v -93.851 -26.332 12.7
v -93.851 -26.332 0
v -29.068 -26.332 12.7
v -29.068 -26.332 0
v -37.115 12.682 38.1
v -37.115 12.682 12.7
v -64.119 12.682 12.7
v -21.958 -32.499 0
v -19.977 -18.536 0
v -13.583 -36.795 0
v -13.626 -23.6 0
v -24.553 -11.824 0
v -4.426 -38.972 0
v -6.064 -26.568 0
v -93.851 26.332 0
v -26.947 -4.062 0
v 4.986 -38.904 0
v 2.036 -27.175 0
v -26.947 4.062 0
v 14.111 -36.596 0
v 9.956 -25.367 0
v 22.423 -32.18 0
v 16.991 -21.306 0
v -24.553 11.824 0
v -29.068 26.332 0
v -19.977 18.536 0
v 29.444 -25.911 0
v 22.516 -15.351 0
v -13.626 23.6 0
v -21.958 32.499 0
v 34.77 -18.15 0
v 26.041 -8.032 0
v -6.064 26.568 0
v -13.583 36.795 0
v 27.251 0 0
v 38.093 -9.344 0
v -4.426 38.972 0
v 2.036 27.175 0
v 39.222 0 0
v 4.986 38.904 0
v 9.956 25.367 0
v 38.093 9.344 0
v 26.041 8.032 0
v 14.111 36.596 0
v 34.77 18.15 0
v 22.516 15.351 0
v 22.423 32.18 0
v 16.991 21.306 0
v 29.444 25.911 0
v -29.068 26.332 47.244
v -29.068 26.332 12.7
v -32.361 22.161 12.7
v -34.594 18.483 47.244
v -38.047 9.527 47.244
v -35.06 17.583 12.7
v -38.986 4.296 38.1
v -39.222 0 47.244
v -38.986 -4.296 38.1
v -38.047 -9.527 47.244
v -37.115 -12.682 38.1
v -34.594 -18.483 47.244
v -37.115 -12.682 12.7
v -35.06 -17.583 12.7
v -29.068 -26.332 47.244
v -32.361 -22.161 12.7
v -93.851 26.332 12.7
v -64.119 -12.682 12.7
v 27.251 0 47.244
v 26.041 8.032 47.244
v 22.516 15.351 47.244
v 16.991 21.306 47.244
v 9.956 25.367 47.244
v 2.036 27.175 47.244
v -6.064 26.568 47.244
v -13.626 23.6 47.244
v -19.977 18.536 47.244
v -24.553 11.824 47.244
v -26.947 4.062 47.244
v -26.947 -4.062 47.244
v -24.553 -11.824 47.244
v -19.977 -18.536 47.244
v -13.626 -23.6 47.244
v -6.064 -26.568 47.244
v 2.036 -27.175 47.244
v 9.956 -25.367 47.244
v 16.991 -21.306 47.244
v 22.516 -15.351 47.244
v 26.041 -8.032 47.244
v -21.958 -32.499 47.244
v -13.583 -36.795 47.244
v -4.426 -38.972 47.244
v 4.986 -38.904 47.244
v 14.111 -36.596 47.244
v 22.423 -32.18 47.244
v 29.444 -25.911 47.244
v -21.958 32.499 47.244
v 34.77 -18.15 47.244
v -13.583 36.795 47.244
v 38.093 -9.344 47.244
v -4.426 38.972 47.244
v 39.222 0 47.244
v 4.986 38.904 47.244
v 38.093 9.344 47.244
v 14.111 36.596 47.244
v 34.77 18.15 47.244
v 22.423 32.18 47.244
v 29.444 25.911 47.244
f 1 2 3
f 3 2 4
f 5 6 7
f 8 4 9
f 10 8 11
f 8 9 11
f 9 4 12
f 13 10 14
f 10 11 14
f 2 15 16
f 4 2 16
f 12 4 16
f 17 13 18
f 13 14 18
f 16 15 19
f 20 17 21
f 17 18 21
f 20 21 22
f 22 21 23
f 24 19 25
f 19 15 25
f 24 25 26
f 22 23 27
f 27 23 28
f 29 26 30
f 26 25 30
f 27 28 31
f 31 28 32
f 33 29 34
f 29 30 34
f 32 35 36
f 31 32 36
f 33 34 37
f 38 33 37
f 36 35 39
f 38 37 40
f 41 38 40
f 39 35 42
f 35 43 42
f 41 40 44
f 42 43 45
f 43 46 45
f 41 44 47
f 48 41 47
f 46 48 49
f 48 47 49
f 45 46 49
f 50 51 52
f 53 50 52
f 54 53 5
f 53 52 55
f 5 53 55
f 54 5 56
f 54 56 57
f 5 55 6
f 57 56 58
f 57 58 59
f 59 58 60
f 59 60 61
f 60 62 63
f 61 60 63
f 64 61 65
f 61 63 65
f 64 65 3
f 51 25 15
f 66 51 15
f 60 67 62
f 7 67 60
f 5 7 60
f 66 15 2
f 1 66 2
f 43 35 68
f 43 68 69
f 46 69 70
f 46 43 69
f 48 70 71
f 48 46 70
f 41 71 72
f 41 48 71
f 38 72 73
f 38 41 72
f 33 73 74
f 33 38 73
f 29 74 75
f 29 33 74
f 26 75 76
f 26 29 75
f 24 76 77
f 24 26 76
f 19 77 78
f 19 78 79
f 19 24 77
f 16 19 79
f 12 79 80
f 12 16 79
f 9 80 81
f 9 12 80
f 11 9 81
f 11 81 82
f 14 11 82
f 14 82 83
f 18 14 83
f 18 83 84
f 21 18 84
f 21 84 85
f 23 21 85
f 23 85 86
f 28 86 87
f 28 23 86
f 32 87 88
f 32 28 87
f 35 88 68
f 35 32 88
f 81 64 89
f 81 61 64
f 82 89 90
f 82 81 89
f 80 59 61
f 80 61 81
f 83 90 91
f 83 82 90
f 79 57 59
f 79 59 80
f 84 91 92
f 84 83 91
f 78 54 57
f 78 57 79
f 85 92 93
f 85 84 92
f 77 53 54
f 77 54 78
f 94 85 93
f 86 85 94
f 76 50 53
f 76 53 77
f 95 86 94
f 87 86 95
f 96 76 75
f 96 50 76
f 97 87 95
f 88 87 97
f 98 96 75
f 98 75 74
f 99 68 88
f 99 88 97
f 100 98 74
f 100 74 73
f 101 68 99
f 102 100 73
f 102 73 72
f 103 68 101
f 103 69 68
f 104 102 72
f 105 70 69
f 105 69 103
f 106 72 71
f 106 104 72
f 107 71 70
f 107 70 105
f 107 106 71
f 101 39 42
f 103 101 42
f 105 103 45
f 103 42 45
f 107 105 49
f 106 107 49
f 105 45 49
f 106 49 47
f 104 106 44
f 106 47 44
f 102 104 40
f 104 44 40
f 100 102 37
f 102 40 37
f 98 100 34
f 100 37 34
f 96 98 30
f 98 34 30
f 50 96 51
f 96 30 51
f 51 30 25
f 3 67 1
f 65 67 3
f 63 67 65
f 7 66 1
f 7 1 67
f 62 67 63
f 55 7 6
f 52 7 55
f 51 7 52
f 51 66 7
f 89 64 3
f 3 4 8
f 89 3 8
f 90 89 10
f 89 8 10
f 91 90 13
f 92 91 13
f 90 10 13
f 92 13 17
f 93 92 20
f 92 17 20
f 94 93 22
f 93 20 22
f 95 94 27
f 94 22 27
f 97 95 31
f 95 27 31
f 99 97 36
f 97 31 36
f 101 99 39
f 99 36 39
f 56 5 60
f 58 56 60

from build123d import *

# Parameters (mm, degrees)
F0_R     = 27.251254
F1_DEPTH = 47.244
F2_DEPTH = 12.7
F4_DEPTH = 25.4
F6_DEPTH = 51.905433


with BuildPart() as f1:
    # F0 (on Top) → F1 (new body)
    with BuildSketch(Plane.XY):
        with BuildLine():
            ThreePointArc((-29.068472, -26.332406), (14.11109, -36.595749), (39.222081, 0))
            ThreePointArc((39.222081, 0), (14.11109, 36.595749), (-29.068472, 26.332406))
            ThreePointArc((-29.068472, 26.332406), (-39.222081, 0), (-29.068472, -26.332406))
        make_face()
        Circle(F0_R, mode=Mode.SUBTRACT)
    extrude(amount=F1_DEPTH)

    # F0 (on Top) → F2 (join)
    with BuildSketch(Plane.XY):
        with BuildLine():
            ThreePointArc((-29.068472, -26.332406), (-39.222081, 0), (-29.068472, 26.332406))
            Line((-29.068472, 26.332406), (-93.851398, 26.332406))
            Line((-93.851398, 26.332406), (-93.851398, -26.332406))
            Line((-93.851398, -26.332406), (-29.068472, -26.332406))
        make_face()
    extrude(amount=F2_DEPTH)

    # F3 (on face) → F4 (join)
    with BuildSketch(Plane.XY.offset(12.7)):
        with BuildLine():
            ThreePointArc((-37.115086, -12.682351), (-39.222081, 0), (-37.115086, 12.682351))
            Line((-37.115086, 12.682351), (-64.119155, 12.682351))
            Line((-64.119155, 12.682351), (-64.119155, -12.682351))
            Line((-64.119155, -12.682351), (-37.115086, -12.682351))
        make_face()
    extrude(amount=F4_DEPTH)

    # F5 (on face) → F6 (cut, through all)
    with BuildSketch(Plane.XZ.offset(12.682351)):
        Polygon((-64.119155, 12.7), (-37.115086, 38.1), (-64.119155, 38.1), align=None)
    extrude(amount=-F6_DEPTH, mode=Mode.SUBTRACT)


solid = f1.part
